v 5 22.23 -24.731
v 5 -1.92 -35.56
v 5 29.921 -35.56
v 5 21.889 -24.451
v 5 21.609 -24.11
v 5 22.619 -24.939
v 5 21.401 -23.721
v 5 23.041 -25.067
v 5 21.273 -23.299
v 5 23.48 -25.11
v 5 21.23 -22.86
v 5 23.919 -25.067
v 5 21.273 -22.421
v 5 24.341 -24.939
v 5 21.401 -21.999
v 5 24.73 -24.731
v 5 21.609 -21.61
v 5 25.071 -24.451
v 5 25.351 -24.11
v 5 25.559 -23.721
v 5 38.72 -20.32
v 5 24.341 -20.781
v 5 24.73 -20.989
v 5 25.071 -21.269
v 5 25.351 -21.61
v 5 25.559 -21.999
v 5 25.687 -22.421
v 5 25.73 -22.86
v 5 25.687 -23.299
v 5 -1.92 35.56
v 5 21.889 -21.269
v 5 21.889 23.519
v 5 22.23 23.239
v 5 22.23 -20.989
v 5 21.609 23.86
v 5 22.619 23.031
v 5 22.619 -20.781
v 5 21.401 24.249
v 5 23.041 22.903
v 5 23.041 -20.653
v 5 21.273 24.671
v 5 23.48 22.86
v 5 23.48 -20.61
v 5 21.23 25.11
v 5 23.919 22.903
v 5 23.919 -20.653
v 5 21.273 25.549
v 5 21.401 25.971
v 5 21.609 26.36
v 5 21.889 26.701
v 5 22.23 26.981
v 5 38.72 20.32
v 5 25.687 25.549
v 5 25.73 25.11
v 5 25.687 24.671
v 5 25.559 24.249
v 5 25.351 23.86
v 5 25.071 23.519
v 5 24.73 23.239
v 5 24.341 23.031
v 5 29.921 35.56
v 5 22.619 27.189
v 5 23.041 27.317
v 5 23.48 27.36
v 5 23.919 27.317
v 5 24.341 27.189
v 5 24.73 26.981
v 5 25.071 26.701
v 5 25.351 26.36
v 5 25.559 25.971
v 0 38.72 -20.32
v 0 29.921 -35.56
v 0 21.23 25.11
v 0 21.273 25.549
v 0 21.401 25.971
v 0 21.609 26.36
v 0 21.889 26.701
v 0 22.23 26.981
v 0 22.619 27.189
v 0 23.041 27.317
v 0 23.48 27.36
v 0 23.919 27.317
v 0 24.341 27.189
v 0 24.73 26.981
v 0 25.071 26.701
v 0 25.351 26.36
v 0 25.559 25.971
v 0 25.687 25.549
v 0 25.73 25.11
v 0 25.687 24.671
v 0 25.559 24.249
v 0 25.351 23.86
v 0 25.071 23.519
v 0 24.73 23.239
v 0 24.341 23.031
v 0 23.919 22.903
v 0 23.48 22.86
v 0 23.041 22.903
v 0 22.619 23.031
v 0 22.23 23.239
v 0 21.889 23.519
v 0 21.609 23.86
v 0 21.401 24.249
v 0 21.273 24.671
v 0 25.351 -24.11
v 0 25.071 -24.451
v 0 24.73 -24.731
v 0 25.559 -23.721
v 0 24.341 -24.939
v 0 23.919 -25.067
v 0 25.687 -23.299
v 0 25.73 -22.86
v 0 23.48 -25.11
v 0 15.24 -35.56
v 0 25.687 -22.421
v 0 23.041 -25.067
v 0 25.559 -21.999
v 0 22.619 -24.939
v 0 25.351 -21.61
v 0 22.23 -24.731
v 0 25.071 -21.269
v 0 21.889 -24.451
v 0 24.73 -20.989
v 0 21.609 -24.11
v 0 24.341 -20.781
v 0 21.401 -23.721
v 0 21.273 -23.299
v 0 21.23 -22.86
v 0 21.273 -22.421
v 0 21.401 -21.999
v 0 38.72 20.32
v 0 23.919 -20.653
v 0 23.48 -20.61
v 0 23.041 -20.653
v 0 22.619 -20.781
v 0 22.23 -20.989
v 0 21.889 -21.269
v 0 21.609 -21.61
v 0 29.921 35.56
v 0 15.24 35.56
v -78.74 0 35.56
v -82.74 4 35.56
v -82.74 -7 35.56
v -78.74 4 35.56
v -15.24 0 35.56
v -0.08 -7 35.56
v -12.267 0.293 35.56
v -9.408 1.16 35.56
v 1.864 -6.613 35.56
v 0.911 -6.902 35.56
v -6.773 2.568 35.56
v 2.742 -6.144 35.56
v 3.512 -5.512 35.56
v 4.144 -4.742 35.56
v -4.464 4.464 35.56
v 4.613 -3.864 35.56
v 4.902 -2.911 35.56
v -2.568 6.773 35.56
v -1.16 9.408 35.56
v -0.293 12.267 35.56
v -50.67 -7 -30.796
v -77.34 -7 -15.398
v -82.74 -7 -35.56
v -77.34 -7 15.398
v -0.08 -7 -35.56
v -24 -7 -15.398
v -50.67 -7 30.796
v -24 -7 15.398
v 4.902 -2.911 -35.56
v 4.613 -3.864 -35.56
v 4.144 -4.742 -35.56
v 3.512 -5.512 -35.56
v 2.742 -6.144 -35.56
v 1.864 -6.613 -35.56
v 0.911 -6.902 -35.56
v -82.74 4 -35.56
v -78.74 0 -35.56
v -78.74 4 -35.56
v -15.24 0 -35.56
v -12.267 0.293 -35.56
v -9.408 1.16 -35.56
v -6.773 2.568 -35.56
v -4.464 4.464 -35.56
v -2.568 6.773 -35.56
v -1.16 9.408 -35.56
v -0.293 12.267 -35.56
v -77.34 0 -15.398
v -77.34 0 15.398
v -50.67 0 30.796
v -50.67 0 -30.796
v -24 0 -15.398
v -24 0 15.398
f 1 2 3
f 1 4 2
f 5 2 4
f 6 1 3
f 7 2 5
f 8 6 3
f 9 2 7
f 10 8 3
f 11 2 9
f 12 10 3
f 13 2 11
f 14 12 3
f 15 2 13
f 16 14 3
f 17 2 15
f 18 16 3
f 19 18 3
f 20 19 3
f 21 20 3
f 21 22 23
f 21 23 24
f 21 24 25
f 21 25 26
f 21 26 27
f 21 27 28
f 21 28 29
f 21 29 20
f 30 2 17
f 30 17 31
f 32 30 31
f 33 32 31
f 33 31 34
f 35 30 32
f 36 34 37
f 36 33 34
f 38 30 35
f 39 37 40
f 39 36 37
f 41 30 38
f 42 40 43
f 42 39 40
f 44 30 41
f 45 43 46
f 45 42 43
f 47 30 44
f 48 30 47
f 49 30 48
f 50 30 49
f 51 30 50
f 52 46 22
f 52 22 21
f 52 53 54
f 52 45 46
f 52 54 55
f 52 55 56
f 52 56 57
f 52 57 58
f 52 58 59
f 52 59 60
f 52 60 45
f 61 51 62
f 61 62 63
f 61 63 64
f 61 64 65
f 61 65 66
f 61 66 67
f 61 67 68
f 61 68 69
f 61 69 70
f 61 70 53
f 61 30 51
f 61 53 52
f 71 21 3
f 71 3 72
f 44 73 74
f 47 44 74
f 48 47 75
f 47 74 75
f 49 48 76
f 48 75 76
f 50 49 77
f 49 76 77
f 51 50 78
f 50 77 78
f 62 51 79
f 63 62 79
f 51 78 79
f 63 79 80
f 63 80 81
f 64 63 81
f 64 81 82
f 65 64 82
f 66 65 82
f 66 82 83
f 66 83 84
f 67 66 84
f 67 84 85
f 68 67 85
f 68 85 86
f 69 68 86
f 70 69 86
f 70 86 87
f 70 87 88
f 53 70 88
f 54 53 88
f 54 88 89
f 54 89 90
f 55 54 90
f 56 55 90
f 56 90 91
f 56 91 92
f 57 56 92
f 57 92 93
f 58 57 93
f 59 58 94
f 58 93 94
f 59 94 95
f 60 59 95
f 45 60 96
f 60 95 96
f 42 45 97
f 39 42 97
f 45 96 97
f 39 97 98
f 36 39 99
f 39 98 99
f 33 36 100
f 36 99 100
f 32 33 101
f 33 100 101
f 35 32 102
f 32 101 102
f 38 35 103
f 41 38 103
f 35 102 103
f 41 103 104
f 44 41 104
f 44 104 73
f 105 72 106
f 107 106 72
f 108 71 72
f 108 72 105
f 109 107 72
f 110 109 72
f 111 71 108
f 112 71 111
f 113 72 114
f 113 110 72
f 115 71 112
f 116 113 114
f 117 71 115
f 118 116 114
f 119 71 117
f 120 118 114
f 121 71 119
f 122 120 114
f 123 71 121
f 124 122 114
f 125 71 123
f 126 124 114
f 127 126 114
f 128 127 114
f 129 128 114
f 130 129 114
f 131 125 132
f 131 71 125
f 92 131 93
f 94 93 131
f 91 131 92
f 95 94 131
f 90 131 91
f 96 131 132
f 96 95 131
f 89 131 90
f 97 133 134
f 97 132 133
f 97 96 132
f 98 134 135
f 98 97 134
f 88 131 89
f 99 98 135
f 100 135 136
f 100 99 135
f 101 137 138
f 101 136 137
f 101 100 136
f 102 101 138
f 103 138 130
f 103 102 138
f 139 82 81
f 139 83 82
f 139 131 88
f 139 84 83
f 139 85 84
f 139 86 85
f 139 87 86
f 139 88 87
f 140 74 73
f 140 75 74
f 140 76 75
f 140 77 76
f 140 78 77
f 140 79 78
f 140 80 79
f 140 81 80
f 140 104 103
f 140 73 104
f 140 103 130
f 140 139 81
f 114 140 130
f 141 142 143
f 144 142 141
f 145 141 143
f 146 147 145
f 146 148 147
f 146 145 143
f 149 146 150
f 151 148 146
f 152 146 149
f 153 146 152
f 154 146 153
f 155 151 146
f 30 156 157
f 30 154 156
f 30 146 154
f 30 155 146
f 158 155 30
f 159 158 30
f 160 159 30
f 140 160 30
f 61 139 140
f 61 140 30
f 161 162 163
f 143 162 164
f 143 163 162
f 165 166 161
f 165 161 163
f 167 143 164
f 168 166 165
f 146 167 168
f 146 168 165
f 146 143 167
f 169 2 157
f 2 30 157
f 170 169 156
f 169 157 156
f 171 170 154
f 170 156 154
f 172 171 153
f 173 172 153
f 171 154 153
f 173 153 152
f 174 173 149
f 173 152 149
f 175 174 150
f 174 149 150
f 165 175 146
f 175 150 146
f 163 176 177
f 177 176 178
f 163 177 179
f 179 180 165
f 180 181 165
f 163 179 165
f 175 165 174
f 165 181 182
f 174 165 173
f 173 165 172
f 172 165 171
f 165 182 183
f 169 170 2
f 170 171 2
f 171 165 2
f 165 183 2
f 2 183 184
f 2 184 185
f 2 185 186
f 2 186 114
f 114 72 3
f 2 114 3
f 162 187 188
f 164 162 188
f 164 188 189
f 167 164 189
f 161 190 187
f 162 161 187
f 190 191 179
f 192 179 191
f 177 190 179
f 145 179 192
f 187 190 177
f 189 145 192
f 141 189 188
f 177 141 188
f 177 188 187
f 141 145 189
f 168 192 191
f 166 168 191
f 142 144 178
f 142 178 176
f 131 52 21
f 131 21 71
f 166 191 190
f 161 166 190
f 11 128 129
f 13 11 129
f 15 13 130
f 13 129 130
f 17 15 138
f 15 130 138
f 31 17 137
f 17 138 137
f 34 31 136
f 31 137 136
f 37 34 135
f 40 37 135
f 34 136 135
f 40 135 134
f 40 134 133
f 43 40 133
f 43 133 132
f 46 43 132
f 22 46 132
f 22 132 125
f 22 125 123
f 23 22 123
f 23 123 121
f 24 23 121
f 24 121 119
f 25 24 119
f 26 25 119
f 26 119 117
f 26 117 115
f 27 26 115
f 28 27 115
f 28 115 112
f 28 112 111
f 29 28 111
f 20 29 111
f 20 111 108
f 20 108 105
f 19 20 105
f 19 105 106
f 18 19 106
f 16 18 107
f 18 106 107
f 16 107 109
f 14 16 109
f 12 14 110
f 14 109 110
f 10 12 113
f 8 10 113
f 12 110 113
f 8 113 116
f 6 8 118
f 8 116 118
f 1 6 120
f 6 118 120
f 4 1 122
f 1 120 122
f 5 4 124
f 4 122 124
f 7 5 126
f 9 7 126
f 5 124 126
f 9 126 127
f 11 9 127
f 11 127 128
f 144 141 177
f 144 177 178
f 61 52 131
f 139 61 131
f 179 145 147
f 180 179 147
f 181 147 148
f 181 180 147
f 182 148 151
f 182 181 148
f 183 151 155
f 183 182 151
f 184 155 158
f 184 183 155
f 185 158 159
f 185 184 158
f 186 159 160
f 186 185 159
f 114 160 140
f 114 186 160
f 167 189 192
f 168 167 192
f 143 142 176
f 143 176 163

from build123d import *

# Parameters (mm, degrees)
F1_DEPTH = 35.56
F3_DEPTH = 7.001
F4_R     = 15.24
F5_R     = 5.08
F6_R     = 2.25
F7_DEPTH = 5.001
F8_SIZE2 = 8.7988181024
F8_SIZE  = 15.24


with BuildPart() as f1:
    # F0 (on Top) → F1 (new body, symmetric)
    with BuildSketch(Plane.XY):
        Polygon((0, 0), (-78.74, 0), (-78.74, 4), (-82.74, 4), (-82.74, -7), (5, -7), (5, 38.72), (0, 38.72), align=None)
    extrude(amount=F1_DEPTH, both=True)

    # F2 (on face) → F3 (cut, through all)
    with BuildSketch(Plane(origin=(0, 0, 0), x_dir=(-1, 0, 0), z_dir=(0, 1, 0))):
        Polygon((77.34, 15.3979316793), (50.67, 30.7958633586), (24, 15.3979316793), (24, -15.3979316793), (50.67, -30.7958633586), (77.34, -15.3979316793), align=None)
    extrude(amount=-F3_DEPTH, mode=Mode.SUBTRACT)

    # F4
    f4_edges = [f1.edges().sort_by_distance(p)[0] for p in [
        (0, 0, 0),
    ]]
    fillet(f4_edges, radius=F4_R)

    # F5
    f5_edges = [f1.edges().sort_by_distance(p)[0] for p in [
        (5, -7, 0),
    ]]
    fillet(f5_edges, radius=F5_R)

    # F6 (on face) → F7 (cut, through all)
    with BuildSketch(Plane(origin=(0, 0, 0), x_dir=(0, -1, 0), z_dir=(-1, 0, 0))):
        with Locations((-23.48, 25.11)):
            Circle(F6_R)
        with Locations((-23.48, -22.86)):
            Circle(F6_R)
    extrude(amount=-F7_DEPTH, mode=Mode.SUBTRACT)

    # F8
    f8_edges = [f1.edges().sort_by_distance(p)[0] for p in [
        (2.5, 38.72, 35.56),
        (2.5, 38.72, -35.56),
    ]]
    f8_side = f1.faces().sort_by_distance((2.5, 38.72, 0))[0]
    chamfer(f8_edges, length=F8_SIZE, length2=F8_SIZE2, reference=f8_side)


solid = f1.part
